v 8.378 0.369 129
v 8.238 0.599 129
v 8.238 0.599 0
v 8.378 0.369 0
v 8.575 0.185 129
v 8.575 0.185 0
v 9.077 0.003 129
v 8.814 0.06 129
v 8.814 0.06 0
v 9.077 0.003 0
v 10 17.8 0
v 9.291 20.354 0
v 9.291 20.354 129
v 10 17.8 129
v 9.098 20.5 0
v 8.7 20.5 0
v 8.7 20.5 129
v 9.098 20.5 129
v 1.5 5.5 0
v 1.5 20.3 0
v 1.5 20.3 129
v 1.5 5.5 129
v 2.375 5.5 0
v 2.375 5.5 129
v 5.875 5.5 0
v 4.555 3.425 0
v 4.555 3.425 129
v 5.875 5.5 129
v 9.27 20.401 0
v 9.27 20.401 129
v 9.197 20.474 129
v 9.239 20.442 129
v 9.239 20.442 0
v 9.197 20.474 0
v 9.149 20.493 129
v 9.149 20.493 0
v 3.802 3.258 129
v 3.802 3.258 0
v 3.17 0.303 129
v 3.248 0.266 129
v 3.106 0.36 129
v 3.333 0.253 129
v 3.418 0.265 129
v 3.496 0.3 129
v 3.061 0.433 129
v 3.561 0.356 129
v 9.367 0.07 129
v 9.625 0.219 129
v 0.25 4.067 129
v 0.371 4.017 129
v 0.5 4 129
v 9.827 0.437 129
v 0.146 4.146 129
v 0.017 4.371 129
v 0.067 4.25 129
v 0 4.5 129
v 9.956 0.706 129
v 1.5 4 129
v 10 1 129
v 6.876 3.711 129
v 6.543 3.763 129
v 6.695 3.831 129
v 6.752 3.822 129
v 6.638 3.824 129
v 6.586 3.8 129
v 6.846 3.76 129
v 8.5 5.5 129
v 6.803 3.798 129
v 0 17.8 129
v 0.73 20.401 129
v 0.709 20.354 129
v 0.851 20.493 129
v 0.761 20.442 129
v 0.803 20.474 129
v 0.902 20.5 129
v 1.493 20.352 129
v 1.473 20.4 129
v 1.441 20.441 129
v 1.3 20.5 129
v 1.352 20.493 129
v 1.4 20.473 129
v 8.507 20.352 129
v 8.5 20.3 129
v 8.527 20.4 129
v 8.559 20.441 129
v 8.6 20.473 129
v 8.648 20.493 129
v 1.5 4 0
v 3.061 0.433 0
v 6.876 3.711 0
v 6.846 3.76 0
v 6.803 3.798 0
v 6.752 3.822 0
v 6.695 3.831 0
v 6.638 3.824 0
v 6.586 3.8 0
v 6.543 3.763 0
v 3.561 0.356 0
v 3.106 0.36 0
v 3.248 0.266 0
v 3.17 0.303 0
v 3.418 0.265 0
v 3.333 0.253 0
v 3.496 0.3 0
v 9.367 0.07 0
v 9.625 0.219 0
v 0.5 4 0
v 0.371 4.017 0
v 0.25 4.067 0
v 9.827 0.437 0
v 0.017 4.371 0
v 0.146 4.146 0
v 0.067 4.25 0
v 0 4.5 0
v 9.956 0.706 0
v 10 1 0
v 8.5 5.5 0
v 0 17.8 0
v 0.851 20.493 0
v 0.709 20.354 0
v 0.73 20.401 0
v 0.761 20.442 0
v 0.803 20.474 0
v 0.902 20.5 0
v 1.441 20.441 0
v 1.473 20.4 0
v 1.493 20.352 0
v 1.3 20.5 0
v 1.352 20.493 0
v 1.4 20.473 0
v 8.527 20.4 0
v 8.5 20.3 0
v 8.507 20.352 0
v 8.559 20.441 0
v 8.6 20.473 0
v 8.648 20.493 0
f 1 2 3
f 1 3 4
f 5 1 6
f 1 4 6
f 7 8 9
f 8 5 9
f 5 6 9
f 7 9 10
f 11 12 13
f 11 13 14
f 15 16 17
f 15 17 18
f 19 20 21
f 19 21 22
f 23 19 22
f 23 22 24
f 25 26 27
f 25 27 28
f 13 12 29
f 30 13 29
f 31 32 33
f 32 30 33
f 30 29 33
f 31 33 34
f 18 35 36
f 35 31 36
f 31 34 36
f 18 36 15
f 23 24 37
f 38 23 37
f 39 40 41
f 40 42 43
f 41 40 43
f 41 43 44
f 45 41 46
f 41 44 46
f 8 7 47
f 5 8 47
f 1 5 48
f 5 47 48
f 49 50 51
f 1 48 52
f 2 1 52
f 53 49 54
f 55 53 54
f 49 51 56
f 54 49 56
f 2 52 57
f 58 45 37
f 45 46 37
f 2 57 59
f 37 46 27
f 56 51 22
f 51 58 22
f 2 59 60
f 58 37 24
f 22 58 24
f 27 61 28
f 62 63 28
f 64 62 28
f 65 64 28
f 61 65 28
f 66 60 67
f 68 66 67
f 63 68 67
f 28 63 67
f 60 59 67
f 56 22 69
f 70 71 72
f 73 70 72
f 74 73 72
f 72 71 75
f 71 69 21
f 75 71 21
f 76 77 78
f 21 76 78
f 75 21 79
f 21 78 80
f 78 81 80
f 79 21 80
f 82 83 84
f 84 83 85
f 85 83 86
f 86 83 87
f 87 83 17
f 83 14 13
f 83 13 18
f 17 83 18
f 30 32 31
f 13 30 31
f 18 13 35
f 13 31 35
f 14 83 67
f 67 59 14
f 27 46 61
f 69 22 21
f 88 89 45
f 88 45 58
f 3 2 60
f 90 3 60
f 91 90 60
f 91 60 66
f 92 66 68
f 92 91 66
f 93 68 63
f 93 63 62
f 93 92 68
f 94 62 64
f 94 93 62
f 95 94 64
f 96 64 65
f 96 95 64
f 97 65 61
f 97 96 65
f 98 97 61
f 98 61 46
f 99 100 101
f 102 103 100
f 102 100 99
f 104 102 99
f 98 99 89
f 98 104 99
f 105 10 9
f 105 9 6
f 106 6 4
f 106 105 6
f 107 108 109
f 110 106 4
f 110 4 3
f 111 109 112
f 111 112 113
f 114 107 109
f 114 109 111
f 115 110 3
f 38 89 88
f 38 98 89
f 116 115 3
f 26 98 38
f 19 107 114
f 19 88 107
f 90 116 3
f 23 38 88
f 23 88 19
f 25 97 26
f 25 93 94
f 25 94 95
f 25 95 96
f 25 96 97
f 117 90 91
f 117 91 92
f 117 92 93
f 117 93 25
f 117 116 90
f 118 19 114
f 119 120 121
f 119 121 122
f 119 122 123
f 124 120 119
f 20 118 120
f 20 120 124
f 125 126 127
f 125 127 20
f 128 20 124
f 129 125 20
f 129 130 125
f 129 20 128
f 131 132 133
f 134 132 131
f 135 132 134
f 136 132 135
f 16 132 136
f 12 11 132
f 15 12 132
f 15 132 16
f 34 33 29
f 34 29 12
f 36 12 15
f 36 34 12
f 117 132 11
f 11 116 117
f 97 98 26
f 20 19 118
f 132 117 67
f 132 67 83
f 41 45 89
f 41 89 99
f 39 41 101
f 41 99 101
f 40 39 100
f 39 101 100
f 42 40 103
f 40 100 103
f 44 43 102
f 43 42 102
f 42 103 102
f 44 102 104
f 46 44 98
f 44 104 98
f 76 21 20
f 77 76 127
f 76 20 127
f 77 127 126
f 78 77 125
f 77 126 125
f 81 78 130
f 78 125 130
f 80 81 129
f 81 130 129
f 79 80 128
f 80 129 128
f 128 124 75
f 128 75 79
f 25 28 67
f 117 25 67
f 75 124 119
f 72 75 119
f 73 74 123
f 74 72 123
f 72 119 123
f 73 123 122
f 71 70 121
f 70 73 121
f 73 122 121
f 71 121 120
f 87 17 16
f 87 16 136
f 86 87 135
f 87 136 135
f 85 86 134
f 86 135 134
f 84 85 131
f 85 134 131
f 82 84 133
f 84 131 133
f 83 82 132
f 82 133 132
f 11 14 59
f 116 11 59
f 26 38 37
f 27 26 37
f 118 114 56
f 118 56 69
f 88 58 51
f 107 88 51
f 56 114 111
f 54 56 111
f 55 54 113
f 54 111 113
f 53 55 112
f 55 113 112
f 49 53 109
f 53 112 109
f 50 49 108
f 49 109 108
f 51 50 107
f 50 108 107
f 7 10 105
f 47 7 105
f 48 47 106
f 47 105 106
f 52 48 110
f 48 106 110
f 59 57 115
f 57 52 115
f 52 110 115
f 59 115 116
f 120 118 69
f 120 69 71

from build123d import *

# Parameters (mm, degrees)
BOSS_EXTRUDE1_DEPTH = 129
FILLET1_R           = 0.2
FILLET1_R_2         = 0.3
FILLET1_R_3         = 1
FILLET1_R_4         = 0.5
CHAMFER1_SIZE       = 0.8
CHAMFER1_SIZE2      = 0.601769912


with BuildPart() as part:
    # Sketch1 → Boss-Extrude1 (new body)
    with BuildSketch(Plane.XY):
        Polygon((1.5, 20.5), (1.5, 5.5), (2.375, 5.5), (4.125, 2.75), (5.875, 5.5), (8.5, 5.5), (8.5, 20.5), (9.25, 20.5), (10, 17.8), (10, 0), (8.5, 0), (6.75, 4), (3.25, 0), (1.5, 4), (0, 4), (0, 17.8), (0.75, 20.5), align=None)
    extrude(amount=BOSS_EXTRUDE1_DEPTH)

    # Fillet1
    # the kernel refuses this fillet: 1, 0.5, 0.3, 0.2 mm, written as the material it adds along each edge
    with BuildSketch(Plane(origin=(6.75, 4, 0), x_dir=(0.40081883401970875, -0.9161573349021888, 0), z_dir=(0, 0, 1))) as fillet1_piece_1:
        with BuildLine():
            CenterArc((FILLET1_R * 1.57528283018, -FILLET1_R), FILLET1_R, 90, 115.184697104)
            Line((FILLET1_R * 0.670342090327, -FILLET1_R * 1.42553760981), (0, 0))
            Line((0, 0), (FILLET1_R * 1.57528283018, 0))
        make_face()
    extrude(amount=129)
    # the kernel refuses this fillet: 1, 0.5, 0.3, 0.2 mm, written as the material it takes off along each edge
    with BuildSketch(Plane(origin=(3.25, 0, -1.181462123), x_dir=(0.6585046078685179, 0.752576694706878, 0), z_dir=(0, 0, 1))) as fillet1_2_piece_1:
        with BuildLine():
            CenterArc((FILLET1_R_2 * 1.57528283018, FILLET1_R_2), FILLET1_R_2, 154.815302896, 115.184697104)
            Line((FILLET1_R_2 * 0.670342090327, FILLET1_R_2 * 1.42553760981), (0, 0))
            Line((0, 0), (FILLET1_R_2 * 1.57528283018, 0))
        make_face()
    extrude(amount=131.362924245, mode=Mode.SUBTRACT)
    with BuildSketch(Plane(origin=(8.5, 0, -1.635038937), x_dir=(1, 0, 0), z_dir=(0, 0, 1))) as fillet1_2_piece_2:
        with BuildLine():
            CenterArc((FILLET1_R_3 * 0.654015574786, FILLET1_R_3), FILLET1_R_3, 203.629377731, 66.370622269)
            Line((-FILLET1_R_3 * 0.262141760116, FILLET1_R_3 * 0.59918116598), (0, 0))
            Line((0, 0), (FILLET1_R_3 * 0.654015574786, 0))
        make_face()
    extrude(amount=132.270077874, mode=Mode.SUBTRACT)
    with BuildSketch(Plane(origin=(10, 0, -2.5), x_dir=(0, 1, 0), z_dir=(0, 0, 1))) as fillet1_2_piece_3:
        with BuildLine():
            CenterArc((FILLET1_R_3, FILLET1_R_3), FILLET1_R_3, 180, 90)
            Line((0, FILLET1_R_3), (0, 0))
            Line((0, 0), (FILLET1_R_3, 0))
        make_face()
    extrude(amount=134, mode=Mode.SUBTRACT)
    with BuildSketch(Plane(origin=(0, 4, -1.25), x_dir=(1, 0, 0), z_dir=(0, 0, 1))) as fillet1_2_piece_4:
        with BuildLine():
            CenterArc((FILLET1_R_4, FILLET1_R_4), FILLET1_R_4, 180, 90)
            Line((0, FILLET1_R_4), (0, 0))
            Line((0, 0), (FILLET1_R_4, 0))
        make_face()
    extrude(amount=131.5, mode=Mode.SUBTRACT)
    with BuildSketch(Plane(origin=(9.25, 20.5, -0.380042825), x_dir=(-1, 0, 0), z_dir=(0, 0, 1))) as fillet1_2_piece_5:
        with BuildLine():
            CenterArc((FILLET1_R * 0.760085649571, FILLET1_R), FILLET1_R, 195.524110997, 74.475889003)
            Line((-FILLET1_R * 0.203432260059, FILLET1_R * 0.732356136214), (0, 0))
            Line((0, 0), (FILLET1_R * 0.760085649571, 0))
        make_face()
    extrude(amount=129.76008565, mode=Mode.SUBTRACT)
    with BuildSketch(Plane(origin=(8.5, 20.5, -0.5), x_dir=(0, -1, 0), z_dir=(0, 0, 1))) as fillet1_2_piece_6:
        with BuildLine():
            CenterArc((FILLET1_R, FILLET1_R), FILLET1_R, 180, 90)
            Line((0, FILLET1_R), (0, 0))
            Line((0, 0), (FILLET1_R, 0))
        make_face()
    extrude(amount=130, mode=Mode.SUBTRACT)
    with BuildSketch(Plane(origin=(1.5, 20.5, -0.5), x_dir=(0, -1, 0), z_dir=(0, 0, 1))) as fillet1_2_piece_7:
        with BuildLine():
            CenterArc((FILLET1_R, -FILLET1_R), FILLET1_R, 90, 90)
            Line((0, -FILLET1_R), (0, 0))
            Line((0, 0), (FILLET1_R, 0))
        make_face()
    extrude(amount=130, mode=Mode.SUBTRACT)
    with BuildSketch(Plane(origin=(0.75, 20.5, -0.380042825), x_dir=(1, 0, 0), z_dir=(0, 0, 1))) as fillet1_2_piece_8:
        with BuildLine():
            CenterArc((FILLET1_R * 0.760085649571, -FILLET1_R), FILLET1_R, 90, 74.475889003)
            Line((-FILLET1_R * 0.203432260059, -FILLET1_R * 0.732356136214), (0, 0))
            Line((0, 0), (FILLET1_R * 0.760085649571, 0))
        make_face()
    extrude(amount=129.76008565, mode=Mode.SUBTRACT)

    # Chamfer1
    chamfer1_edges = [part.edges().sort_by_distance(p)[0] for p in [
        (4.125, 2.75, 64.5),
    ]]
    chamfer1_side = [part.faces().sort_by_distance(p)[0] for p in [
        (5, 4.125, 64.5),
    ]]
    chamfer(chamfer1_edges, length=CHAMFER1_SIZE, length2=CHAMFER1_SIZE2, reference=chamfer1_side[0])


solid = part.part
